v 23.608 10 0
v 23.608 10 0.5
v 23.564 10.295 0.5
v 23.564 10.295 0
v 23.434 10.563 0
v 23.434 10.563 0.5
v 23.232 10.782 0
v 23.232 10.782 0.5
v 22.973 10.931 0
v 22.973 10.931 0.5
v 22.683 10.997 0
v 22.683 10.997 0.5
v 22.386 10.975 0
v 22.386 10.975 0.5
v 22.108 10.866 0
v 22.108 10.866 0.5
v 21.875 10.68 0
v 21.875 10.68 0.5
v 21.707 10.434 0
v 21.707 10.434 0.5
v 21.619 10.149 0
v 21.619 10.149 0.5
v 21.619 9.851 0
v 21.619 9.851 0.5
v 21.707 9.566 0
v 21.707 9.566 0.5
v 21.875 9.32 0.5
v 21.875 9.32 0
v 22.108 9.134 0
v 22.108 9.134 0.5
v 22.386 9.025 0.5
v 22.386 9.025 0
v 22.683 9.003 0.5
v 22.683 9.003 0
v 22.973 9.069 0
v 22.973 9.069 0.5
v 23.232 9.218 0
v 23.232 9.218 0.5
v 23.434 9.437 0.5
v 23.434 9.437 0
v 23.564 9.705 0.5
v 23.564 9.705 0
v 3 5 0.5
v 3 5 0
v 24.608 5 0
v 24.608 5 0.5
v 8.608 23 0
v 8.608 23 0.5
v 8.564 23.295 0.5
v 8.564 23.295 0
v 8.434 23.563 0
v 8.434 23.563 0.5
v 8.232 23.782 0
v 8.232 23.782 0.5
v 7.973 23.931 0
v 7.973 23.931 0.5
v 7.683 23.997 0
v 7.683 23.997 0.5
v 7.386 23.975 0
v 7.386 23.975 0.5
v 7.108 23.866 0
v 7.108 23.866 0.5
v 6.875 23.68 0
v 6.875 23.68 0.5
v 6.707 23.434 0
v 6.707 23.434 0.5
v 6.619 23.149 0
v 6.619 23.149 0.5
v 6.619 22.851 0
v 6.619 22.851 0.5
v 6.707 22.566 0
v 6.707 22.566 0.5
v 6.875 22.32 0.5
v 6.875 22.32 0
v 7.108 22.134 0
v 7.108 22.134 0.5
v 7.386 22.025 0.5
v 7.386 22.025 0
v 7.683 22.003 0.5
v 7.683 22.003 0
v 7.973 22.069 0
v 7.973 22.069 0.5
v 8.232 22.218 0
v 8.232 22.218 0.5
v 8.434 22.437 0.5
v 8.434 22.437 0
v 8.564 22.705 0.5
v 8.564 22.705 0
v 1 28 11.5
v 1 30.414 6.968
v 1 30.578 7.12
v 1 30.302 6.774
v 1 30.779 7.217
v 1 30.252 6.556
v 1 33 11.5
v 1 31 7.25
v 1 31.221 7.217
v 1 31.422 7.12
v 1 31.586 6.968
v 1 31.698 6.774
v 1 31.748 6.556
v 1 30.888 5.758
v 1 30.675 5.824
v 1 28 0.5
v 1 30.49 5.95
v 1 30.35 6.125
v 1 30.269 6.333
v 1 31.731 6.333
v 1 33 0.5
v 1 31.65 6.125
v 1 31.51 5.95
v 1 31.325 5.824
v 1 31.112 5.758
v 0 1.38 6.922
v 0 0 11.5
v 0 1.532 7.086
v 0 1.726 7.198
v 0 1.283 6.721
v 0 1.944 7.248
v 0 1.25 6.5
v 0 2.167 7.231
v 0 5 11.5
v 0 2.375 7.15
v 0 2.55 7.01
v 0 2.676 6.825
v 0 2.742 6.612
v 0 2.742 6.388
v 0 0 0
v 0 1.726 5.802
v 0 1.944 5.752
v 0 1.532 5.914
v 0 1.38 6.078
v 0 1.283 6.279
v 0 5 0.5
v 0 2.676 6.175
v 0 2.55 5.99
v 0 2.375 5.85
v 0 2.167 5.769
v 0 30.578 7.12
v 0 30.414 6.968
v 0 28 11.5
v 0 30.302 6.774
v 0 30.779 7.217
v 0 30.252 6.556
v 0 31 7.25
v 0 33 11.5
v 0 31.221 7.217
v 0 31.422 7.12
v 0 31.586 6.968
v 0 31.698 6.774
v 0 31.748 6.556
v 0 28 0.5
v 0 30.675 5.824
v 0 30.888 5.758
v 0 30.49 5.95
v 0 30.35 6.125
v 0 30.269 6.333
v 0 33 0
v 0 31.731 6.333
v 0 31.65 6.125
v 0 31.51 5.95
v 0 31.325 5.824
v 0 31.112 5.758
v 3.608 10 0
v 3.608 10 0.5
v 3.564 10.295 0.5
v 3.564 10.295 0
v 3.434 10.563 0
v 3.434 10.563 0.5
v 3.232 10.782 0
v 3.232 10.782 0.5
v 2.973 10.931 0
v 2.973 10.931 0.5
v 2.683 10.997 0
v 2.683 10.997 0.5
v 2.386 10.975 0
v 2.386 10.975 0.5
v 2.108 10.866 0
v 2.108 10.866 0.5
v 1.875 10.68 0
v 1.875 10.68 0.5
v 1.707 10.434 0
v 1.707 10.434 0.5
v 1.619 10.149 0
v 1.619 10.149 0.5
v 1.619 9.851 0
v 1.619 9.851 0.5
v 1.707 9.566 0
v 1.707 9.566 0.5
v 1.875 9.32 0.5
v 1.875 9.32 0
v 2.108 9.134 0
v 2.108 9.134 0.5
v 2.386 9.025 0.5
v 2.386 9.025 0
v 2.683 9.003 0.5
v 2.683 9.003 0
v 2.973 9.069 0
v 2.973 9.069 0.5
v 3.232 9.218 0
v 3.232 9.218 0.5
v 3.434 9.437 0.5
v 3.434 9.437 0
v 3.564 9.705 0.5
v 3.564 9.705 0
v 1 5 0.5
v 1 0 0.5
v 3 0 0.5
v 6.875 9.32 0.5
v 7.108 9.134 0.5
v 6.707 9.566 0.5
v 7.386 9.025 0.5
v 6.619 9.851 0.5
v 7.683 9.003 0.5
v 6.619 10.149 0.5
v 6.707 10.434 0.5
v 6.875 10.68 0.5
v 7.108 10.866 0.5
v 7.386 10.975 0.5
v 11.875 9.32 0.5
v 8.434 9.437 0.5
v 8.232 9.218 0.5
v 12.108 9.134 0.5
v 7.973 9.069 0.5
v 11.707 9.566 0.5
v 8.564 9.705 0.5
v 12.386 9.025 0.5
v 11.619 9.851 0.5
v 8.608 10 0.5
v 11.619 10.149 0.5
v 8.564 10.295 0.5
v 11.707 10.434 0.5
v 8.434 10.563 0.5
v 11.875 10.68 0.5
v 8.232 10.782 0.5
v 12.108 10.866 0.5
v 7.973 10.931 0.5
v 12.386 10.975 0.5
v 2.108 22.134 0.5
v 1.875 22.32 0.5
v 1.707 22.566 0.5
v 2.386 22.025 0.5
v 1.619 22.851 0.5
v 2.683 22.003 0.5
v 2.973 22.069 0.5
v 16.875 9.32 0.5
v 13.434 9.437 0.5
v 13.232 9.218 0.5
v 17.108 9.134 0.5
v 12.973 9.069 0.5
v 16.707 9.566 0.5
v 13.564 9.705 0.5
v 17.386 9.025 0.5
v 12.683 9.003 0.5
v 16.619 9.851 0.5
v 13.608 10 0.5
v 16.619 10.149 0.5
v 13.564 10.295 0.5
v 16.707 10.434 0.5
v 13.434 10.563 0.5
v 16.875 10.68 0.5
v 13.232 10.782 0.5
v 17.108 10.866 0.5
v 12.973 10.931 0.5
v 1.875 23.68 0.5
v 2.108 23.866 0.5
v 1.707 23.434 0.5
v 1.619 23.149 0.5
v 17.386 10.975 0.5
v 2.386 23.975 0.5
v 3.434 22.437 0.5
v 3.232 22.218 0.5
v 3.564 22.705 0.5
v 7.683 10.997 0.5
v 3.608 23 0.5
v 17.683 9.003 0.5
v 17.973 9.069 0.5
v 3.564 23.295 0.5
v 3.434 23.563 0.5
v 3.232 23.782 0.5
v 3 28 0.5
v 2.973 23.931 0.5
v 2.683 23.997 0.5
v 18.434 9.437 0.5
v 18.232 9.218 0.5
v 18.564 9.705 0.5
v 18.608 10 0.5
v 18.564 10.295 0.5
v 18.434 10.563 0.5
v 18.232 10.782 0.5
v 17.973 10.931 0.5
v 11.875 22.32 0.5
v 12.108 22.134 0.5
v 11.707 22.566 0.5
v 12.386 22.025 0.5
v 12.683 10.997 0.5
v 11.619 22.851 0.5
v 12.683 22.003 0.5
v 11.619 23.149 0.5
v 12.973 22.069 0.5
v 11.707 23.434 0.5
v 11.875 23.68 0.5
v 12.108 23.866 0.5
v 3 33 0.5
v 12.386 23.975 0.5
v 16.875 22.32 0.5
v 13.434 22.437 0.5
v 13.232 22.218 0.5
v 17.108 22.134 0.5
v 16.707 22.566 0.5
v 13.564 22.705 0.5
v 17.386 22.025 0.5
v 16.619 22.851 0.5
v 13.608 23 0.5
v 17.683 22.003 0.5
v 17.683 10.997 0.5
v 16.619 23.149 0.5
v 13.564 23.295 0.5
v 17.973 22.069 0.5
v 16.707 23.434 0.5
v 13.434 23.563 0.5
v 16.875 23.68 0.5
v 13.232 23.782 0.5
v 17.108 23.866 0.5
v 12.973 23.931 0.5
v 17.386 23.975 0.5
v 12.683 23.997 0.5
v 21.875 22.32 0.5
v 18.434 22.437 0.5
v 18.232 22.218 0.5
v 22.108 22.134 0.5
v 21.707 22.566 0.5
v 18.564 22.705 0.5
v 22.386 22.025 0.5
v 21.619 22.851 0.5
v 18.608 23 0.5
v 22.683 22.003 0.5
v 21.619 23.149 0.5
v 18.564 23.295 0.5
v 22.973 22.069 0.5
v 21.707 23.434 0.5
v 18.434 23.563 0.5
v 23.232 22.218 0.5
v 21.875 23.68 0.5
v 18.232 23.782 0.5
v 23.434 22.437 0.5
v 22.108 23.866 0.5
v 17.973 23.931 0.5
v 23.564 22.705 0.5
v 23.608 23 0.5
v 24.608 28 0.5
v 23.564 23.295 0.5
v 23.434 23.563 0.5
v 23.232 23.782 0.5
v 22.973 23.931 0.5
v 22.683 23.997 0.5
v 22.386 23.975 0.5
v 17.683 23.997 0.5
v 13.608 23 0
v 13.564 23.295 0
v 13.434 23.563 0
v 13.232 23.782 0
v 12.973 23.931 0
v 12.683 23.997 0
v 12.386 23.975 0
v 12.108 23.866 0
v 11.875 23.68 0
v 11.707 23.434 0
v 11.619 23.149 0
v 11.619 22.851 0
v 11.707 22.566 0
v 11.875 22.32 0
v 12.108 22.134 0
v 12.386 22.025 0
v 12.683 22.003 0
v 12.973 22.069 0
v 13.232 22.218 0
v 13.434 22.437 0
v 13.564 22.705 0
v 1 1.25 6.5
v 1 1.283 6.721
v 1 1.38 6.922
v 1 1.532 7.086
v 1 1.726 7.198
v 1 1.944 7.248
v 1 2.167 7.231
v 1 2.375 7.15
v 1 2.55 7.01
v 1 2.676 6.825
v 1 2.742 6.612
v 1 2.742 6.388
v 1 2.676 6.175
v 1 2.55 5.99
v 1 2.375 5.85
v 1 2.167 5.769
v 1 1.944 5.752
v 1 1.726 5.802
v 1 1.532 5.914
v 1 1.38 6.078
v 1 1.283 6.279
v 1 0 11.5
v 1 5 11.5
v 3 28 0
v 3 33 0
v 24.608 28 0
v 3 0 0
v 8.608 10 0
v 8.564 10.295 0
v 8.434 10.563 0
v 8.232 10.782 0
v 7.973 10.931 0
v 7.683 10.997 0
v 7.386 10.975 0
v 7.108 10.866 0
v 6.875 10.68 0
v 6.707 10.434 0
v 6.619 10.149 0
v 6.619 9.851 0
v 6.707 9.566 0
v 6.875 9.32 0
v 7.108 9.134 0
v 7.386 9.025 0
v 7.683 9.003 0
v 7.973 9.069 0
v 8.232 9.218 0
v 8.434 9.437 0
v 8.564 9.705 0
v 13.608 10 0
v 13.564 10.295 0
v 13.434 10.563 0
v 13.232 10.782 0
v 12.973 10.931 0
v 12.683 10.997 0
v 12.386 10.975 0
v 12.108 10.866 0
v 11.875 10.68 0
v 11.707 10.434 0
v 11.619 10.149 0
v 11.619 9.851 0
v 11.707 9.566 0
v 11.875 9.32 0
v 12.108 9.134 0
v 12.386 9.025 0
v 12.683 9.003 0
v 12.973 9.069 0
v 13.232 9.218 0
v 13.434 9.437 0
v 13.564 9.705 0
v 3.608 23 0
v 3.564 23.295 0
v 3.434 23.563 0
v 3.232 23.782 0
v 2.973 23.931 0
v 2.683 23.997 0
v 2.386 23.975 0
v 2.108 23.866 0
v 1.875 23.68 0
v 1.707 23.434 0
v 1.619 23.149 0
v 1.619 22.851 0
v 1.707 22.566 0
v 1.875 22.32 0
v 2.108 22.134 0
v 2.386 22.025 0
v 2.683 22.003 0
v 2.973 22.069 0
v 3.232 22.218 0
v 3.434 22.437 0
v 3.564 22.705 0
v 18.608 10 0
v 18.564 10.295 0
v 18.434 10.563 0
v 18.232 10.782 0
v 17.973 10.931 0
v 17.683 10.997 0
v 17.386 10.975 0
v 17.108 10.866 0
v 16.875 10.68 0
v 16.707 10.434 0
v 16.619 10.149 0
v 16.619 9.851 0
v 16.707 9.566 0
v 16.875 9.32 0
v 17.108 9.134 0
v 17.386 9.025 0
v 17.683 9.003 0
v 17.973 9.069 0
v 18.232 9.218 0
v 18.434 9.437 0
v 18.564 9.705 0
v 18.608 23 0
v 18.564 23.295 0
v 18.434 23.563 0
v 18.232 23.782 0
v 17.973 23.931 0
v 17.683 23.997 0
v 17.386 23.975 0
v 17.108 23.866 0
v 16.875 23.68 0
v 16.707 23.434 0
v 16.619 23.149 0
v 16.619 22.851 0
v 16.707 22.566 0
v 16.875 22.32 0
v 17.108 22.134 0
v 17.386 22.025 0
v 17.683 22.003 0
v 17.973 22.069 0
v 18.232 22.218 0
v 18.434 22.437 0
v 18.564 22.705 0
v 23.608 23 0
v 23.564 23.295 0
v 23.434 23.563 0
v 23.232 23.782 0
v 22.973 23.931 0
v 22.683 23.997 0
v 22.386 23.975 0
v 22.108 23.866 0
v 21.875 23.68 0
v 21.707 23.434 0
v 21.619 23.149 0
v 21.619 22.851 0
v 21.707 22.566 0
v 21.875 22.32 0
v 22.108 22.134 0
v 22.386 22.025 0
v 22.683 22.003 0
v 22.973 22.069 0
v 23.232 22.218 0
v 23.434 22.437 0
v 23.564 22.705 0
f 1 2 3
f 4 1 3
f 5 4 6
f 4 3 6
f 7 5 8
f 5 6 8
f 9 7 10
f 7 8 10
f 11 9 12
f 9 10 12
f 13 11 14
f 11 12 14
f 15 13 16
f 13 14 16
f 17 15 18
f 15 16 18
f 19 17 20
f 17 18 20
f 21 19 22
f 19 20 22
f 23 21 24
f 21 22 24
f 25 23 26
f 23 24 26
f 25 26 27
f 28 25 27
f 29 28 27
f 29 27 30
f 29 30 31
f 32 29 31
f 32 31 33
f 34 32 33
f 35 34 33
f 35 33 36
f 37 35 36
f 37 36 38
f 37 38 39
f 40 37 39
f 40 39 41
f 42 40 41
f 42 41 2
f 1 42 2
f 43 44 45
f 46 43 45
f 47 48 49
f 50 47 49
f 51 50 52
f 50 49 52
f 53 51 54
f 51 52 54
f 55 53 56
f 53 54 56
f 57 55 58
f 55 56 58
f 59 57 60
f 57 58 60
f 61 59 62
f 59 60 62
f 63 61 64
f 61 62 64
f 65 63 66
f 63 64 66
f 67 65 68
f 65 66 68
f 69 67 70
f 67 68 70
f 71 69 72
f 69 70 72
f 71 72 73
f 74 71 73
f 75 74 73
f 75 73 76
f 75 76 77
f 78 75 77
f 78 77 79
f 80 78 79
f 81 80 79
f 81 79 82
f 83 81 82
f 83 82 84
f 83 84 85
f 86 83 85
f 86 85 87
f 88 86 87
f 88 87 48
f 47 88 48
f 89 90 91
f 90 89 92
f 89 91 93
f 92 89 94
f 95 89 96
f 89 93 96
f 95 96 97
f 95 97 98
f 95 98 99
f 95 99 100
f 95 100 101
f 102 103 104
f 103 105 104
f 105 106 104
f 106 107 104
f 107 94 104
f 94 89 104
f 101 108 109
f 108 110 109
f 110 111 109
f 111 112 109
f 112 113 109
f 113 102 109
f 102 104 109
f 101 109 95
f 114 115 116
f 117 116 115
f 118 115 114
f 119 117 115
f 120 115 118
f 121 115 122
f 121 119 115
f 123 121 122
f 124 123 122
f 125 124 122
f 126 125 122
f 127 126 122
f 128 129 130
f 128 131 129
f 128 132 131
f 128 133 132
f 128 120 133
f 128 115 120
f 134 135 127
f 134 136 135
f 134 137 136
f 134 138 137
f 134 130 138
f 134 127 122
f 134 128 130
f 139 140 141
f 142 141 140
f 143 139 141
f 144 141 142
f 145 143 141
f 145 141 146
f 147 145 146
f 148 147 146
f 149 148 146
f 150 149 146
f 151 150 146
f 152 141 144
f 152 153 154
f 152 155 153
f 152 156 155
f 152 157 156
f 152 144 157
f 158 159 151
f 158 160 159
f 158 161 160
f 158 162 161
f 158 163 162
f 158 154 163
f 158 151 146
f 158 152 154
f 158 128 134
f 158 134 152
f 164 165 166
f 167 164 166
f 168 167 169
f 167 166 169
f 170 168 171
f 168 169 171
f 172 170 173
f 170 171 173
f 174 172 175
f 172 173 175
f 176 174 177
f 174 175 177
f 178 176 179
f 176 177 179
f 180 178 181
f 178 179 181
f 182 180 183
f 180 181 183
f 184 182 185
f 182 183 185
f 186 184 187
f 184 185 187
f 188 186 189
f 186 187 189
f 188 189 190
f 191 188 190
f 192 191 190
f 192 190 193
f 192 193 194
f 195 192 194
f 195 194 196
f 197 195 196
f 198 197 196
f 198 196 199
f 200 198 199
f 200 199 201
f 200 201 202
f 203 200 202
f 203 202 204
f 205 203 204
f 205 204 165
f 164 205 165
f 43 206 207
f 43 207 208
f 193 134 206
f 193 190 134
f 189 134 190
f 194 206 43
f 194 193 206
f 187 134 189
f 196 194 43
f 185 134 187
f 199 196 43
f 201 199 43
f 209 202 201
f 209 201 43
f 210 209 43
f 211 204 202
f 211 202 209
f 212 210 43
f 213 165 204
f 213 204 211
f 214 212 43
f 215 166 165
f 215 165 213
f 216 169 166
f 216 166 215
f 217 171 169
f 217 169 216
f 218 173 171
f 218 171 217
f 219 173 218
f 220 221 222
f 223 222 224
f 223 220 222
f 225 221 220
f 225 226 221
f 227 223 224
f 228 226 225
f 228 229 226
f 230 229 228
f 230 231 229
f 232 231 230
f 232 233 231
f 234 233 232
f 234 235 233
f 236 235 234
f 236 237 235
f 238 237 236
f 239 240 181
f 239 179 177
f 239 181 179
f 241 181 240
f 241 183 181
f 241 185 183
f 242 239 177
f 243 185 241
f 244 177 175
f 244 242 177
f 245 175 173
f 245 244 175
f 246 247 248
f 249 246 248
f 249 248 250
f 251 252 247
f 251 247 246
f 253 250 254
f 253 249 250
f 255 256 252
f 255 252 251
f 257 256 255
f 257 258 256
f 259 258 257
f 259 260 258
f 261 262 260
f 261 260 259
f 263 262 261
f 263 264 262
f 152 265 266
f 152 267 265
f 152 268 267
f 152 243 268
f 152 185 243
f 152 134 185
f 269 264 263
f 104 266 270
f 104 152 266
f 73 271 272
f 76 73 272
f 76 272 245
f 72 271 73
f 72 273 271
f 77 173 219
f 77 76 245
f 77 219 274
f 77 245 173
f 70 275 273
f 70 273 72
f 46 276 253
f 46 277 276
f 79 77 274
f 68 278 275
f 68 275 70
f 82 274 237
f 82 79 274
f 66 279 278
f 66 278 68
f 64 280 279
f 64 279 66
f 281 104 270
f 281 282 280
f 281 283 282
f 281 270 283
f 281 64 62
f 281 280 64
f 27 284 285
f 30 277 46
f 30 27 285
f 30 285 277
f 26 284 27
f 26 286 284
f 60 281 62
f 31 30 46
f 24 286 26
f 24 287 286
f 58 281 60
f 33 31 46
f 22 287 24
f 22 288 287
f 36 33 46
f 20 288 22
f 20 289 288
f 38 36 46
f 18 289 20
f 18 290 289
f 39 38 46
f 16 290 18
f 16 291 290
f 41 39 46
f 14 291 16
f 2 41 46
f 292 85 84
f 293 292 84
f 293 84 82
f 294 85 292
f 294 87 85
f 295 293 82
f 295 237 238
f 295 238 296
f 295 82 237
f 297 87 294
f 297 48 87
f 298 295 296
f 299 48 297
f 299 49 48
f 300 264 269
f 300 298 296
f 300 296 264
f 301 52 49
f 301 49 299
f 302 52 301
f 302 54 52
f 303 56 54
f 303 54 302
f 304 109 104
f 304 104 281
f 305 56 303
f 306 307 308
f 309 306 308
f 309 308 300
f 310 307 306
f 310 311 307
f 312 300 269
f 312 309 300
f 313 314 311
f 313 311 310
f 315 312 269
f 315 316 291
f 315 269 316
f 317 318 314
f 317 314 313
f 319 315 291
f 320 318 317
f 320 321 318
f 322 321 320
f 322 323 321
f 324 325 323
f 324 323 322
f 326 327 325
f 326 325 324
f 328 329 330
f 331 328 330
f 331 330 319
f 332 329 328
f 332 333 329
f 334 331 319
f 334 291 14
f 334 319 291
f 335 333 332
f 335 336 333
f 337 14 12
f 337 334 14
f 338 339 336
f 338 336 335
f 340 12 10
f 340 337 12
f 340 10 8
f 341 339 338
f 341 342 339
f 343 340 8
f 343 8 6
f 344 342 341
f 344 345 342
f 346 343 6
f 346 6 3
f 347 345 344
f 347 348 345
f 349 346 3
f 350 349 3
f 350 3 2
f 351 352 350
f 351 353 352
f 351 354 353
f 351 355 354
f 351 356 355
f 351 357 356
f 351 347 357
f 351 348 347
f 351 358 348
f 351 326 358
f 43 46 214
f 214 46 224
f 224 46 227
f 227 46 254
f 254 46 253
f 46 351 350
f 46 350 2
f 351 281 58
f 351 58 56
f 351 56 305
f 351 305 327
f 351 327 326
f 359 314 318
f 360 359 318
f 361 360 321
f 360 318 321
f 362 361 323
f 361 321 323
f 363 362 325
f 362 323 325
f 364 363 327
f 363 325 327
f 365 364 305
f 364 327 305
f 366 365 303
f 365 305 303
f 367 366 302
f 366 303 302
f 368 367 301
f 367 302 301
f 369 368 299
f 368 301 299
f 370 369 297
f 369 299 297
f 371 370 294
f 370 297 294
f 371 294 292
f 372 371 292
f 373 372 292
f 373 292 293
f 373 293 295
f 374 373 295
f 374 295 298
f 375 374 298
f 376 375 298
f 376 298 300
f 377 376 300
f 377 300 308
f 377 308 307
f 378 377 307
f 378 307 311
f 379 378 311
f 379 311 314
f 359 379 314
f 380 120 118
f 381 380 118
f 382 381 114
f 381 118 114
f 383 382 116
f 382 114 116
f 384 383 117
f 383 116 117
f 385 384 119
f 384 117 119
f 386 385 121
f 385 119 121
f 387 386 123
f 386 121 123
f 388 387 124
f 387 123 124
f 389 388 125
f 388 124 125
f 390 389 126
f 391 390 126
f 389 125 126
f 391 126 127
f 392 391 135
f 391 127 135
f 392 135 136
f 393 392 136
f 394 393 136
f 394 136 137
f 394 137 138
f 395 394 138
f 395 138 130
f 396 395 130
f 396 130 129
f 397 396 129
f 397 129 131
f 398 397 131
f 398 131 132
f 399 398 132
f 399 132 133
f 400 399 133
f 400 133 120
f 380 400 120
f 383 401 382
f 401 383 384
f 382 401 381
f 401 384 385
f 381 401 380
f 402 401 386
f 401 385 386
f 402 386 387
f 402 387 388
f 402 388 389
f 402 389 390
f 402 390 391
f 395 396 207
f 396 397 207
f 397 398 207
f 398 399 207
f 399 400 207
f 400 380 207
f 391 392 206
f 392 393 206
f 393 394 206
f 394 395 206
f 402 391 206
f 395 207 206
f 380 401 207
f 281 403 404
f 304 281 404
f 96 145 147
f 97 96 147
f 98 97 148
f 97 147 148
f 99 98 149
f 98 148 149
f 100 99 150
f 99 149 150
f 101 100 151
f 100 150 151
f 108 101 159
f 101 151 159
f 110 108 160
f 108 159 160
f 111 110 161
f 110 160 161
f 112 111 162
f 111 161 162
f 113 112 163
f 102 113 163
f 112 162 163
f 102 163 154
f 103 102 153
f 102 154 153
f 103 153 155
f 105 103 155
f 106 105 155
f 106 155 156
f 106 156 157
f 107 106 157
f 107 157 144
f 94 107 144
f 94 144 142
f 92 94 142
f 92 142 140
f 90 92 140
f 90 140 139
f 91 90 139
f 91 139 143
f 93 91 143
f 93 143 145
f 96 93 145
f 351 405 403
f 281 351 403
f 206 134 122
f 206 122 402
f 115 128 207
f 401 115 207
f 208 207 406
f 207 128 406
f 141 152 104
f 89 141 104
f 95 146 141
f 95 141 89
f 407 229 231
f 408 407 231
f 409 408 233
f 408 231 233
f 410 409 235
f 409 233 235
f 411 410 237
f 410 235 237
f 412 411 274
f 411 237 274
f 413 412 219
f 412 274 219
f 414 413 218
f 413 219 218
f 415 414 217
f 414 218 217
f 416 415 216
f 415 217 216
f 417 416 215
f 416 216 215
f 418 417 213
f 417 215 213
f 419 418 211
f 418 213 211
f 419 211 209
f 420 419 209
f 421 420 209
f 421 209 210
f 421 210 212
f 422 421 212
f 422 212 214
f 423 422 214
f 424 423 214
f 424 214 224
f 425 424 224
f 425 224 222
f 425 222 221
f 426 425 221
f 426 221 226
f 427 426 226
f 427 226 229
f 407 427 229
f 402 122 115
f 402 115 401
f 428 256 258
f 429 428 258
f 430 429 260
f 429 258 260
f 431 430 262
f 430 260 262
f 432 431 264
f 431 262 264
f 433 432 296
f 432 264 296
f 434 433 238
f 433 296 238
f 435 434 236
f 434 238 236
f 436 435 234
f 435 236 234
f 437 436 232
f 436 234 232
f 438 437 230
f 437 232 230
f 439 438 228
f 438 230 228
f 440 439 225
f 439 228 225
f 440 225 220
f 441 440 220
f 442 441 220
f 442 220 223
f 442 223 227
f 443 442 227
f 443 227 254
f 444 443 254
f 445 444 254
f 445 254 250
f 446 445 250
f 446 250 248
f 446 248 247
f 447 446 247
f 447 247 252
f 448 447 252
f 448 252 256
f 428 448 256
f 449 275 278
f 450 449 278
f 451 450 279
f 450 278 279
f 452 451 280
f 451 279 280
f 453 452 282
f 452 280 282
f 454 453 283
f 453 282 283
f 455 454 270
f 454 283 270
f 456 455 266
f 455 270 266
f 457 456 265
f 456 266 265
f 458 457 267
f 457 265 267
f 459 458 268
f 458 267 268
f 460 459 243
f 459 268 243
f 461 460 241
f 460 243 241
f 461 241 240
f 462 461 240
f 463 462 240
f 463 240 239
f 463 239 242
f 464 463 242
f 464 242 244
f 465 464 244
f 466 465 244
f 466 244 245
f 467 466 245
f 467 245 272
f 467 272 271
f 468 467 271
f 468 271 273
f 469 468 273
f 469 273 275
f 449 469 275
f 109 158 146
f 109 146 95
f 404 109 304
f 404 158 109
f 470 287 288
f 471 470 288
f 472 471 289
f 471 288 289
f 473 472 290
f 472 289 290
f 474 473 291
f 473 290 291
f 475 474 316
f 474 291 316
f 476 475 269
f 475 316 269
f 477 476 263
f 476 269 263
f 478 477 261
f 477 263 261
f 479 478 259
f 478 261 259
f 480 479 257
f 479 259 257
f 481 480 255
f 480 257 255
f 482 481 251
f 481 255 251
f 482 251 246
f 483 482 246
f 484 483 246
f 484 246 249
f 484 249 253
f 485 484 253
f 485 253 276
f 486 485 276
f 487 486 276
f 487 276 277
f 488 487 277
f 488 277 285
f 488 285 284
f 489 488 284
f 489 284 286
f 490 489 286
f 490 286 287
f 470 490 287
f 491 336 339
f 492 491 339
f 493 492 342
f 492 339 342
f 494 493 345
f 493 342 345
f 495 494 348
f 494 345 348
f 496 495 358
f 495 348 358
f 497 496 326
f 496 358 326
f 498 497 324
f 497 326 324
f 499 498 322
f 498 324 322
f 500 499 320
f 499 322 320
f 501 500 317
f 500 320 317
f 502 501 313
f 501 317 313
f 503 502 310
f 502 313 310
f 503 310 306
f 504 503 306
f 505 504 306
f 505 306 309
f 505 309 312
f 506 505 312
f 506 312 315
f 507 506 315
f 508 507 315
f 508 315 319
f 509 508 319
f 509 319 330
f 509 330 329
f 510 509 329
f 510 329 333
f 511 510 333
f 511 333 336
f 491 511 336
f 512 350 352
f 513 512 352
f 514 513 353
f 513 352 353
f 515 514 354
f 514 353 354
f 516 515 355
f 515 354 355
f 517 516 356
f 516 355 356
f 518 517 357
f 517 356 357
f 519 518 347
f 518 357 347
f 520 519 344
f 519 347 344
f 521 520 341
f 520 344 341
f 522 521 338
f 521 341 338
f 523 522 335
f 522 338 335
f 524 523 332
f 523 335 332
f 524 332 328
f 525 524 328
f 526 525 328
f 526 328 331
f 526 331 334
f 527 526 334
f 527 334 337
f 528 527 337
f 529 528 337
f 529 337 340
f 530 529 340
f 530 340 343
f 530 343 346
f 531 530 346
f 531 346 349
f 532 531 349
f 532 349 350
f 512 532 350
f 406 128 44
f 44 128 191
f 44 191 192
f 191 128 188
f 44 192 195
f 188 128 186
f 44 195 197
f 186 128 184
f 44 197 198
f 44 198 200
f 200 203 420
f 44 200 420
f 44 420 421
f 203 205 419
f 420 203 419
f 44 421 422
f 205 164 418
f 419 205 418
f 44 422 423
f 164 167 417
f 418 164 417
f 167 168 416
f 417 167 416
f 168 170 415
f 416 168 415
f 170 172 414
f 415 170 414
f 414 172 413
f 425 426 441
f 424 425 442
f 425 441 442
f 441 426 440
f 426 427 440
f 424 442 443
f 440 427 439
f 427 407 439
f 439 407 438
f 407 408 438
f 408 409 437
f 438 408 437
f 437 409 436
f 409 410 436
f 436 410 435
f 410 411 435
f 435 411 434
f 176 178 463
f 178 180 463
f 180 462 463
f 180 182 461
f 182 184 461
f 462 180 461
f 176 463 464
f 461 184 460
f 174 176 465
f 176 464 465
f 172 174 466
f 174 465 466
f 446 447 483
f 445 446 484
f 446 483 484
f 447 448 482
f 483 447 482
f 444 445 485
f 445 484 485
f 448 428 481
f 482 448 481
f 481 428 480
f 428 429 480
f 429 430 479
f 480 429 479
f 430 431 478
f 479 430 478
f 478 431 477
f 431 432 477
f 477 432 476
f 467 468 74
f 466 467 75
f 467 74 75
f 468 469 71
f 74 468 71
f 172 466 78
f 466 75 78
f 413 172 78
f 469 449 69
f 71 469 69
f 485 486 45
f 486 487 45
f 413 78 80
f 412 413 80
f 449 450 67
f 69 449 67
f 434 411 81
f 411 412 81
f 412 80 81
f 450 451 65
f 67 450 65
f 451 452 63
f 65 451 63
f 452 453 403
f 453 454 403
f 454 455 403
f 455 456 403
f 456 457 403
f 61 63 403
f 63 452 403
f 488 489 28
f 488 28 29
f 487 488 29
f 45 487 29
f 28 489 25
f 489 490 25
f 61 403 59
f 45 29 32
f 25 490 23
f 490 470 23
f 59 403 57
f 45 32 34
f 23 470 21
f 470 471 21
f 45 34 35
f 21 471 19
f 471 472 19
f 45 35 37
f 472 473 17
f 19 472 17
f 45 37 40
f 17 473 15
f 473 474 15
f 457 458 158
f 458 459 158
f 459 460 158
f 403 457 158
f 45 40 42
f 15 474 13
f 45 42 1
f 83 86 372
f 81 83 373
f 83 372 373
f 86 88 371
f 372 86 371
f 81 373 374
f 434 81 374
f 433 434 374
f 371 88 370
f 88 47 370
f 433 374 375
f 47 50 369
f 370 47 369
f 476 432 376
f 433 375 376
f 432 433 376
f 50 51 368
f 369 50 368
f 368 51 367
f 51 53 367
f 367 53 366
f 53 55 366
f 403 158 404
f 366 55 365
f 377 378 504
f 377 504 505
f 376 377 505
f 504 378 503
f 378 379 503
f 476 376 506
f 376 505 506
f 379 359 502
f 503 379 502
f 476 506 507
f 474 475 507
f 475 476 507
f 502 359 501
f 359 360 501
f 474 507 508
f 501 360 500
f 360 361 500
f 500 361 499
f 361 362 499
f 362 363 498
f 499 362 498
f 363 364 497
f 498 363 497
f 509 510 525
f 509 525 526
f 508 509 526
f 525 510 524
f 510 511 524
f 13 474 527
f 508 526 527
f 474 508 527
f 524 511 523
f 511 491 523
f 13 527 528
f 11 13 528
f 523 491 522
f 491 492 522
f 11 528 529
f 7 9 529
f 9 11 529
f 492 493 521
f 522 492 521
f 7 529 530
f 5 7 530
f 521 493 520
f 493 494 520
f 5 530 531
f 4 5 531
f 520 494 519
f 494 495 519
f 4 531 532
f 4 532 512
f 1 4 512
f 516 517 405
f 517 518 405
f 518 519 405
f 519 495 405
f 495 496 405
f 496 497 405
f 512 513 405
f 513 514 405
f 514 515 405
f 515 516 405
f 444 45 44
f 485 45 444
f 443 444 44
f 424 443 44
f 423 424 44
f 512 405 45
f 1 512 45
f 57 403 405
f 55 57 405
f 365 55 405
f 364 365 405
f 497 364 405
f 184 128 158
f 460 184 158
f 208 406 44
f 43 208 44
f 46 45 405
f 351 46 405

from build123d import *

# Parameters (mm, degrees)
BOSS_EXTRU_1_DEPTH      = 0.5
ESQUISSE2_W             = 1
ESQUISSE2_H             = 5
BOSS_EXTRU_2_DEPTH      = 11
ESQUISSE6_R             = 1
ENL_V_MAT_EXTRU_3_DEPTH = 11
ESQUISSE7_R             = 0.75
ENL_V_MAT_EXTRU_4_DEPTH = 11


with BuildPart() as part:
    # Esquisse1 → Boss.-Extru.1 (new body)
    with BuildSketch(Plane.XY):
        Polygon((3, 5), (24.608143501, 5), (24.608143501, 28), (3, 28), (3, 33), (0, 33), (0, 0), (3, 0), align=None)
    extrude(amount=BOSS_EXTRU_1_DEPTH)

    # Esquisse2 → Boss.-Extru.2 (add)
    with BuildSketch(Plane.XY.offset(0.5)):
        with Locations((0.5, 30.5)):
            Rectangle(ESQUISSE2_W, ESQUISSE2_H)
        with Locations((0.5, 2.5)):
            Rectangle(ESQUISSE2_W, ESQUISSE2_H)
    extrude(amount=BOSS_EXTRU_2_DEPTH)

    # Esquisse6 → Enlèv. mat.-Extru.3 (cut)
    with BuildSketch(Plane.XY.offset(0.5)):
        with Locations((22.608143501, 10)):
            Circle(ESQUISSE6_R)
        with Locations((17.608143501, 10)):
            Circle(ESQUISSE6_R)
        with Locations((12.608143501, 10)):
            Circle(ESQUISSE6_R)
        with Locations((7.608143501, 10)):
            Circle(ESQUISSE6_R)
        with Locations((2.608143501, 10)):
            Circle(ESQUISSE6_R)
        with Locations((2.608143501, 23)):
            Circle(ESQUISSE6_R)
        with Locations((7.608143501, 23)):
            Circle(ESQUISSE6_R)
        with Locations((12.608143501, 23)):
            Circle(ESQUISSE6_R)
        with Locations((17.608143501, 23)):
            Circle(ESQUISSE6_R)
        with Locations((22.608143501, 23)):
            Circle(ESQUISSE6_R)
    extrude(amount=-ENL_V_MAT_EXTRU_3_DEPTH, mode=Mode.SUBTRACT)

    # Esquisse7 → Enlèv. mat.-Extru.4 (cut)
    with BuildSketch(Plane.ZY):
        with Locations((6.5, 31)):
            Circle(ESQUISSE7_R)
        with Locations(Location((6.5, 2, 0), (0, 0, 270))):
            Circle(ESQUISSE7_R)
    extrude(amount=-ENL_V_MAT_EXTRU_4_DEPTH, mode=Mode.SUBTRACT)


solid = part.part
